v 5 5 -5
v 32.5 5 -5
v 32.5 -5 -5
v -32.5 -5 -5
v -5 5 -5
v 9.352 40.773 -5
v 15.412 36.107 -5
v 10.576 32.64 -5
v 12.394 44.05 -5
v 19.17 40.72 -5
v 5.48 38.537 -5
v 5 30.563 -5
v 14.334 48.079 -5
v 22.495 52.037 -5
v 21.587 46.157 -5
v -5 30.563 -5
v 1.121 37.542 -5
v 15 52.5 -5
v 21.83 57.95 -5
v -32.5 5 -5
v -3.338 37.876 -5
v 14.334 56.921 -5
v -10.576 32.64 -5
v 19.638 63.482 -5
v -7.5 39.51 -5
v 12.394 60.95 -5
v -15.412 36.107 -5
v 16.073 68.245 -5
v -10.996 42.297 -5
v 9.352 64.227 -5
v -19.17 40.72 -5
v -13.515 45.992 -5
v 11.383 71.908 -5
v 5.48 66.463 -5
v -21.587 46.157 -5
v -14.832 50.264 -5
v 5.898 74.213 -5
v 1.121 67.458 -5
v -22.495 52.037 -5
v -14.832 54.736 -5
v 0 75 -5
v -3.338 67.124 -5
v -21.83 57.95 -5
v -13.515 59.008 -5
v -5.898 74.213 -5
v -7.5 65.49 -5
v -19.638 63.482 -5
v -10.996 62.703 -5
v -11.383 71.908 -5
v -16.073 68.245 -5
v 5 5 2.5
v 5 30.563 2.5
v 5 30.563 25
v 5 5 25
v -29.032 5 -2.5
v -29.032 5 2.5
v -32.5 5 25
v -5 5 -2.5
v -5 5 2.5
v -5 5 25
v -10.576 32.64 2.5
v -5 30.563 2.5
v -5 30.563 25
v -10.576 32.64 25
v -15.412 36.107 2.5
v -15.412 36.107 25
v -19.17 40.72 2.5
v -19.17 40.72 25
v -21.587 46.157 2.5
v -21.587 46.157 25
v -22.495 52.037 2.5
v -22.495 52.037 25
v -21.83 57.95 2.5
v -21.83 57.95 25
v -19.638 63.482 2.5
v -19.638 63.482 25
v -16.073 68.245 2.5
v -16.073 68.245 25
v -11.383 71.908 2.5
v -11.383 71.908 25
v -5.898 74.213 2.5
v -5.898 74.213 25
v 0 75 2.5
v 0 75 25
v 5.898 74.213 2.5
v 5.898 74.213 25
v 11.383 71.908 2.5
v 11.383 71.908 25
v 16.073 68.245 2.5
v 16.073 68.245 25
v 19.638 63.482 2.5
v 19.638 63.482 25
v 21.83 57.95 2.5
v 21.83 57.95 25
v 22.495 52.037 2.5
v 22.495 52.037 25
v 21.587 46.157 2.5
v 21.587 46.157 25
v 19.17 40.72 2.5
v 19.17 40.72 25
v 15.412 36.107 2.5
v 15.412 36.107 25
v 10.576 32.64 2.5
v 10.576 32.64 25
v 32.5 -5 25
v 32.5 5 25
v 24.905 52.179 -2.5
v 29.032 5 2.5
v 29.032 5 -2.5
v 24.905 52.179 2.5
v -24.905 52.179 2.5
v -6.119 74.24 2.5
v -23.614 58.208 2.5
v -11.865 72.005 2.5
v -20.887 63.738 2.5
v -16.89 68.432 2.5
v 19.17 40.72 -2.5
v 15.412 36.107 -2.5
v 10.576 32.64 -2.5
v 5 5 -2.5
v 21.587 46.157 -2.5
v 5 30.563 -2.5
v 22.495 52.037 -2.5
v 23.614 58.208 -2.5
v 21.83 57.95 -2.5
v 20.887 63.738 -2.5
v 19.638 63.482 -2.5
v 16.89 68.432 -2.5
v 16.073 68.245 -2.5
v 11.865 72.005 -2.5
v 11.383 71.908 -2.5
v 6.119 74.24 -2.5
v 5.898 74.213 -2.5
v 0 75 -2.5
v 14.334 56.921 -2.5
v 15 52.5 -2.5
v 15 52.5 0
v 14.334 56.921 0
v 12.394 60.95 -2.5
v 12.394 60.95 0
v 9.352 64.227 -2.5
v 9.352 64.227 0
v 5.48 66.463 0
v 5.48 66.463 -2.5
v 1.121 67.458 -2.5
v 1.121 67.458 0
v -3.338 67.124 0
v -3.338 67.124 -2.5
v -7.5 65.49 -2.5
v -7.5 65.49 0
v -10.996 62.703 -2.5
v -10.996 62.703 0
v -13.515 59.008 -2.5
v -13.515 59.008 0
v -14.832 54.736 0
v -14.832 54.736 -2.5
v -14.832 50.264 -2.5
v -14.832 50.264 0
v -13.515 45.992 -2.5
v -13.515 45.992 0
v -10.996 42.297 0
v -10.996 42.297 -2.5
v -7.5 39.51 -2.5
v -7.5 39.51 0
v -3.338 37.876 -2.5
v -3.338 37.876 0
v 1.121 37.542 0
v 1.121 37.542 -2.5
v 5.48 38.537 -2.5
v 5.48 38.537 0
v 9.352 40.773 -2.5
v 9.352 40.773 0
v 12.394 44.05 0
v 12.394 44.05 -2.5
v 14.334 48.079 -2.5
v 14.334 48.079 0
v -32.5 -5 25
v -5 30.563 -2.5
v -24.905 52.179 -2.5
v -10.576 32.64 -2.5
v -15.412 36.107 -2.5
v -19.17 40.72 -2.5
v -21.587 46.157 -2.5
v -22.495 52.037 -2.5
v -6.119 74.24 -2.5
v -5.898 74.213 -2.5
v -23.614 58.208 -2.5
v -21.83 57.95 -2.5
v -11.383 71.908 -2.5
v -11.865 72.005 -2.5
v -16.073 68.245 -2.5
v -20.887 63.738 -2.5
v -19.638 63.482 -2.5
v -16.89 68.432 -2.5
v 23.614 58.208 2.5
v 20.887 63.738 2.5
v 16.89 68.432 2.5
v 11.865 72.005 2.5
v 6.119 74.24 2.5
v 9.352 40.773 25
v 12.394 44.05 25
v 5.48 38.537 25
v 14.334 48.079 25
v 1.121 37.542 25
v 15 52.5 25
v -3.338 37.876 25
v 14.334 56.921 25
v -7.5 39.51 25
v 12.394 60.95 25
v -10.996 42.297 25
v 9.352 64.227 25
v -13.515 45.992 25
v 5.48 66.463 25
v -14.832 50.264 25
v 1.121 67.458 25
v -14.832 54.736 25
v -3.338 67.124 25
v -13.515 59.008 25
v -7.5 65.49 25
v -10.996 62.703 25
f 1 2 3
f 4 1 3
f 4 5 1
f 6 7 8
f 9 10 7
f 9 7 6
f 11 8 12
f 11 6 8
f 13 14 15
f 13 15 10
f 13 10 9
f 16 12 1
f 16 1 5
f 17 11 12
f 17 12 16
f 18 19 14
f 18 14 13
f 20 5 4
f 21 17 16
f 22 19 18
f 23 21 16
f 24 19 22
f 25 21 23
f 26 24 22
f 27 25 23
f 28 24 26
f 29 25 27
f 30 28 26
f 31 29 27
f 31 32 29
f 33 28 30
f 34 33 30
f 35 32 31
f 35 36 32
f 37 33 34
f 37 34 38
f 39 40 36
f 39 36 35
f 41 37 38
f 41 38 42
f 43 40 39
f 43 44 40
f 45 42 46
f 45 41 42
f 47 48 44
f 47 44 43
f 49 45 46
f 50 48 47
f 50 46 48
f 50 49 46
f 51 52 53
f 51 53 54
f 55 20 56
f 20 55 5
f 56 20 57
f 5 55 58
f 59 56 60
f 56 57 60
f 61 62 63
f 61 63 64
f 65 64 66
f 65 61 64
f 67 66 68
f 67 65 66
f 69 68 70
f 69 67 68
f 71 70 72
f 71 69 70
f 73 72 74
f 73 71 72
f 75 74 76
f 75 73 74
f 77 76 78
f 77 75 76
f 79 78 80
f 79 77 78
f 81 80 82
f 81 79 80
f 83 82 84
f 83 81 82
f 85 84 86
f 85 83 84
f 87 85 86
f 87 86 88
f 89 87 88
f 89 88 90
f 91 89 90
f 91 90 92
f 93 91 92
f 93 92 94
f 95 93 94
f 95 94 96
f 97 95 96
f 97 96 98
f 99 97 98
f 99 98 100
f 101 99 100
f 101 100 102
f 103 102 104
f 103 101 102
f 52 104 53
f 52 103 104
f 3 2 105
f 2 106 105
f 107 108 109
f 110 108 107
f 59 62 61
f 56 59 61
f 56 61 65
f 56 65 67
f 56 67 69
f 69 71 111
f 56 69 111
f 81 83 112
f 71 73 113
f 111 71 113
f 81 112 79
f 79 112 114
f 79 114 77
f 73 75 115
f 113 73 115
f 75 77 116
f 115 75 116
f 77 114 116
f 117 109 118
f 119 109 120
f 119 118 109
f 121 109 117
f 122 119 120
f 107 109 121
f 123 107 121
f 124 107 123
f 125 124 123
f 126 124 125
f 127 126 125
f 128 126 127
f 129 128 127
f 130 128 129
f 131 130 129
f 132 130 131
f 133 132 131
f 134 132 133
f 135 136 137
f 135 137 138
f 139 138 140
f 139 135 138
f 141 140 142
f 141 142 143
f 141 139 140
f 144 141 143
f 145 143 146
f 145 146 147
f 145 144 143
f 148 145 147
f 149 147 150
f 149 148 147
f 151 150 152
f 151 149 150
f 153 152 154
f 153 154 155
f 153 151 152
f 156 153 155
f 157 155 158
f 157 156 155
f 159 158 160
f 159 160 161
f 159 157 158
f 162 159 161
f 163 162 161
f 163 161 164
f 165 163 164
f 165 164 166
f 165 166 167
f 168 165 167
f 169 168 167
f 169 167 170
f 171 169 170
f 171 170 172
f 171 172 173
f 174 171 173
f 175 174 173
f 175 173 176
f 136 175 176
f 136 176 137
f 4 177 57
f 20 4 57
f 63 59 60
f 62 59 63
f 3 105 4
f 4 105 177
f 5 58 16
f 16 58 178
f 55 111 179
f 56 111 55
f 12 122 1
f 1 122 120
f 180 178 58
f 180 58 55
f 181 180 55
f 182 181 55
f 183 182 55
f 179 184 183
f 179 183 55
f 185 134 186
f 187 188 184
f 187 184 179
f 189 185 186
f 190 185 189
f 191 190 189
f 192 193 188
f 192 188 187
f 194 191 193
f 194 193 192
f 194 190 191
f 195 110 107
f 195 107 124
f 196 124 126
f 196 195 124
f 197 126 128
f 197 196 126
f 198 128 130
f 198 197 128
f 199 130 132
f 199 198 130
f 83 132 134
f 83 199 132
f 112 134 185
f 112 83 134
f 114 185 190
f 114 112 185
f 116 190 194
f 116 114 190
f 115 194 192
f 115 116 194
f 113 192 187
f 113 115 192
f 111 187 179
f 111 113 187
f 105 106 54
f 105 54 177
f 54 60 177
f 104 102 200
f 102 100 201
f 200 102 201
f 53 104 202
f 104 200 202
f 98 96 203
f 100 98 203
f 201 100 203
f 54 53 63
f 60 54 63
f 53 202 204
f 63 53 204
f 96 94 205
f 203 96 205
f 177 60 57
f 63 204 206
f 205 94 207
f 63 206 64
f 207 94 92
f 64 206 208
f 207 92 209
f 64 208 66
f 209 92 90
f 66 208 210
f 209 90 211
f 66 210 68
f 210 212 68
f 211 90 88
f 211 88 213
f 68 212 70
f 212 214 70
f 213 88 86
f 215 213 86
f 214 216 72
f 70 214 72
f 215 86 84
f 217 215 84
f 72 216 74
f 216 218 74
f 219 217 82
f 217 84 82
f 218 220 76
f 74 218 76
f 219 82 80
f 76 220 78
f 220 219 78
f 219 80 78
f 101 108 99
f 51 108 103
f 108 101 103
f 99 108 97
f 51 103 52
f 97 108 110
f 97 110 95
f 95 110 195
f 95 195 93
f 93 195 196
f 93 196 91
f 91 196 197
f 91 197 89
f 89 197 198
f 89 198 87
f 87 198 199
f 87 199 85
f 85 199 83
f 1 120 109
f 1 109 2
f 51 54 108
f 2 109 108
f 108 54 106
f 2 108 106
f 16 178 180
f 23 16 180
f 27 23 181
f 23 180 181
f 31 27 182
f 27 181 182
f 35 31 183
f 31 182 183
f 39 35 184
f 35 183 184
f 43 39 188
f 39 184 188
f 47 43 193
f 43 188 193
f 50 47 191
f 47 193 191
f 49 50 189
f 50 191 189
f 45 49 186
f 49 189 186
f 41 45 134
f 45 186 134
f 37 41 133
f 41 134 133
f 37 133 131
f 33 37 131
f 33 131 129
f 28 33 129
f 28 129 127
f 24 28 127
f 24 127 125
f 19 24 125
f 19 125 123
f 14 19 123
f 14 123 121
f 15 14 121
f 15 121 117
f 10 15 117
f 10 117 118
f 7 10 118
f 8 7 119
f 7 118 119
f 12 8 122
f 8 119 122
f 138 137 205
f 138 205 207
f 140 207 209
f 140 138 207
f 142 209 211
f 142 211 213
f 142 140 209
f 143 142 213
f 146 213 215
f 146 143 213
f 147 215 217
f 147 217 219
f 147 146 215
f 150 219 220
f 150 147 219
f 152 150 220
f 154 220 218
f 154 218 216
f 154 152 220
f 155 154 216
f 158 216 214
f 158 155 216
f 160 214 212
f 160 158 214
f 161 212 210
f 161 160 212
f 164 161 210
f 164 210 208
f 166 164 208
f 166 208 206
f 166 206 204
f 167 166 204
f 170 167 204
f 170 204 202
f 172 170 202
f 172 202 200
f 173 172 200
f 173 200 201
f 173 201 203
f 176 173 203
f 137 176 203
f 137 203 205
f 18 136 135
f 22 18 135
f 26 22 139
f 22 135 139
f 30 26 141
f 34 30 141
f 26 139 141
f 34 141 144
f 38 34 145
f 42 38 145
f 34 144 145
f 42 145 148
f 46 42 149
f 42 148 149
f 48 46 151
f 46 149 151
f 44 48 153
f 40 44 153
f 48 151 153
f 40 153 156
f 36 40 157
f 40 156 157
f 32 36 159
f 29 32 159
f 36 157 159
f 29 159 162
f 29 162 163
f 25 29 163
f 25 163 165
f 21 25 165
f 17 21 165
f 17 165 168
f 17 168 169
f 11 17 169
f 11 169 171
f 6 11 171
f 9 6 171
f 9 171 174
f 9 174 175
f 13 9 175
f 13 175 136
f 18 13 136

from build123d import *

# Parameters (mm, degrees)
SKICA1_R                     = 15
P_IDAT_VYSUNUT_M1_DEPTH      = 2.5
P_IDAT_VYSUNUT_M2_DEPTH      = 25
P_IDAT_VYSUNUT_M2_DEPTH_BACK = 5
SKICA1_3_R                   = 15


with BuildPart() as part:
    # Skica1 → P_idat vysunut_m1 (new, symmetric)
    with BuildSketch(Plane.XY):
        with BuildLine():
            Line((32.5, 5), (29.032485797, 5))
            Line((29.032485797, 5), (24.904867452, 52.178893569))
            ThreePointArc((24.904867452, 52.178893569), (0, 75), (-24.904867452, 52.178893569))
            Line((-24.904867452, 52.178893569), (-29.032485797, 5))
            Line((-29.032485797, 5), (-32.5, 5))
            Line((-32.5, 5), (-32.5, -5))
            Line((-32.5, -5), (32.5, -5))
            Line((32.5, -5), (32.5, 5))
        make_face()
        with Locations((0, 52.5)):
            Circle(SKICA1_R, mode=Mode.SUBTRACT)
    extrude(amount=P_IDAT_VYSUNUT_M1_DEPTH, both=True)

    # Skica1_3 → P_idat vysunut_m2 (add, two sides: drawn at the far end of the back side and taken through both)
    with BuildSketch(Plane.XY.offset(-P_IDAT_VYSUNUT_M2_DEPTH_BACK)):
        with BuildLine():
            ThreePointArc((-7.9e-08, 75), (-22.358910385, 55.015775508), (-5, 30.562589032))
            Line((-5, 30.562589032), (-5, 5))
            Line((-5, 5), (-29.032485797, 5))
            Line((-29.032485797, 5), (-32.5, 5))
            Line((-32.5, 5), (-32.5, -5))
            Line((-32.5, -5), (32.5, -5))
            Line((32.5, -5), (32.5, 5))
            Line((32.5, 5), (29.032485797, 5))
            Line((29.032485797, 5), (5, 5))
            Line((5, 5), (5, 30.562589032))
            ThreePointArc((5, 30.562589032), (22.358910376, 55.015775587), (-7.9e-08, 75))
        make_face()
        with Locations((0, 52.5)):
            Circle(SKICA1_3_R, mode=Mode.SUBTRACT)
    extrude(amount=P_IDAT_VYSUNUT_M2_DEPTH + P_IDAT_VYSUNUT_M2_DEPTH_BACK)


solid = part.part
